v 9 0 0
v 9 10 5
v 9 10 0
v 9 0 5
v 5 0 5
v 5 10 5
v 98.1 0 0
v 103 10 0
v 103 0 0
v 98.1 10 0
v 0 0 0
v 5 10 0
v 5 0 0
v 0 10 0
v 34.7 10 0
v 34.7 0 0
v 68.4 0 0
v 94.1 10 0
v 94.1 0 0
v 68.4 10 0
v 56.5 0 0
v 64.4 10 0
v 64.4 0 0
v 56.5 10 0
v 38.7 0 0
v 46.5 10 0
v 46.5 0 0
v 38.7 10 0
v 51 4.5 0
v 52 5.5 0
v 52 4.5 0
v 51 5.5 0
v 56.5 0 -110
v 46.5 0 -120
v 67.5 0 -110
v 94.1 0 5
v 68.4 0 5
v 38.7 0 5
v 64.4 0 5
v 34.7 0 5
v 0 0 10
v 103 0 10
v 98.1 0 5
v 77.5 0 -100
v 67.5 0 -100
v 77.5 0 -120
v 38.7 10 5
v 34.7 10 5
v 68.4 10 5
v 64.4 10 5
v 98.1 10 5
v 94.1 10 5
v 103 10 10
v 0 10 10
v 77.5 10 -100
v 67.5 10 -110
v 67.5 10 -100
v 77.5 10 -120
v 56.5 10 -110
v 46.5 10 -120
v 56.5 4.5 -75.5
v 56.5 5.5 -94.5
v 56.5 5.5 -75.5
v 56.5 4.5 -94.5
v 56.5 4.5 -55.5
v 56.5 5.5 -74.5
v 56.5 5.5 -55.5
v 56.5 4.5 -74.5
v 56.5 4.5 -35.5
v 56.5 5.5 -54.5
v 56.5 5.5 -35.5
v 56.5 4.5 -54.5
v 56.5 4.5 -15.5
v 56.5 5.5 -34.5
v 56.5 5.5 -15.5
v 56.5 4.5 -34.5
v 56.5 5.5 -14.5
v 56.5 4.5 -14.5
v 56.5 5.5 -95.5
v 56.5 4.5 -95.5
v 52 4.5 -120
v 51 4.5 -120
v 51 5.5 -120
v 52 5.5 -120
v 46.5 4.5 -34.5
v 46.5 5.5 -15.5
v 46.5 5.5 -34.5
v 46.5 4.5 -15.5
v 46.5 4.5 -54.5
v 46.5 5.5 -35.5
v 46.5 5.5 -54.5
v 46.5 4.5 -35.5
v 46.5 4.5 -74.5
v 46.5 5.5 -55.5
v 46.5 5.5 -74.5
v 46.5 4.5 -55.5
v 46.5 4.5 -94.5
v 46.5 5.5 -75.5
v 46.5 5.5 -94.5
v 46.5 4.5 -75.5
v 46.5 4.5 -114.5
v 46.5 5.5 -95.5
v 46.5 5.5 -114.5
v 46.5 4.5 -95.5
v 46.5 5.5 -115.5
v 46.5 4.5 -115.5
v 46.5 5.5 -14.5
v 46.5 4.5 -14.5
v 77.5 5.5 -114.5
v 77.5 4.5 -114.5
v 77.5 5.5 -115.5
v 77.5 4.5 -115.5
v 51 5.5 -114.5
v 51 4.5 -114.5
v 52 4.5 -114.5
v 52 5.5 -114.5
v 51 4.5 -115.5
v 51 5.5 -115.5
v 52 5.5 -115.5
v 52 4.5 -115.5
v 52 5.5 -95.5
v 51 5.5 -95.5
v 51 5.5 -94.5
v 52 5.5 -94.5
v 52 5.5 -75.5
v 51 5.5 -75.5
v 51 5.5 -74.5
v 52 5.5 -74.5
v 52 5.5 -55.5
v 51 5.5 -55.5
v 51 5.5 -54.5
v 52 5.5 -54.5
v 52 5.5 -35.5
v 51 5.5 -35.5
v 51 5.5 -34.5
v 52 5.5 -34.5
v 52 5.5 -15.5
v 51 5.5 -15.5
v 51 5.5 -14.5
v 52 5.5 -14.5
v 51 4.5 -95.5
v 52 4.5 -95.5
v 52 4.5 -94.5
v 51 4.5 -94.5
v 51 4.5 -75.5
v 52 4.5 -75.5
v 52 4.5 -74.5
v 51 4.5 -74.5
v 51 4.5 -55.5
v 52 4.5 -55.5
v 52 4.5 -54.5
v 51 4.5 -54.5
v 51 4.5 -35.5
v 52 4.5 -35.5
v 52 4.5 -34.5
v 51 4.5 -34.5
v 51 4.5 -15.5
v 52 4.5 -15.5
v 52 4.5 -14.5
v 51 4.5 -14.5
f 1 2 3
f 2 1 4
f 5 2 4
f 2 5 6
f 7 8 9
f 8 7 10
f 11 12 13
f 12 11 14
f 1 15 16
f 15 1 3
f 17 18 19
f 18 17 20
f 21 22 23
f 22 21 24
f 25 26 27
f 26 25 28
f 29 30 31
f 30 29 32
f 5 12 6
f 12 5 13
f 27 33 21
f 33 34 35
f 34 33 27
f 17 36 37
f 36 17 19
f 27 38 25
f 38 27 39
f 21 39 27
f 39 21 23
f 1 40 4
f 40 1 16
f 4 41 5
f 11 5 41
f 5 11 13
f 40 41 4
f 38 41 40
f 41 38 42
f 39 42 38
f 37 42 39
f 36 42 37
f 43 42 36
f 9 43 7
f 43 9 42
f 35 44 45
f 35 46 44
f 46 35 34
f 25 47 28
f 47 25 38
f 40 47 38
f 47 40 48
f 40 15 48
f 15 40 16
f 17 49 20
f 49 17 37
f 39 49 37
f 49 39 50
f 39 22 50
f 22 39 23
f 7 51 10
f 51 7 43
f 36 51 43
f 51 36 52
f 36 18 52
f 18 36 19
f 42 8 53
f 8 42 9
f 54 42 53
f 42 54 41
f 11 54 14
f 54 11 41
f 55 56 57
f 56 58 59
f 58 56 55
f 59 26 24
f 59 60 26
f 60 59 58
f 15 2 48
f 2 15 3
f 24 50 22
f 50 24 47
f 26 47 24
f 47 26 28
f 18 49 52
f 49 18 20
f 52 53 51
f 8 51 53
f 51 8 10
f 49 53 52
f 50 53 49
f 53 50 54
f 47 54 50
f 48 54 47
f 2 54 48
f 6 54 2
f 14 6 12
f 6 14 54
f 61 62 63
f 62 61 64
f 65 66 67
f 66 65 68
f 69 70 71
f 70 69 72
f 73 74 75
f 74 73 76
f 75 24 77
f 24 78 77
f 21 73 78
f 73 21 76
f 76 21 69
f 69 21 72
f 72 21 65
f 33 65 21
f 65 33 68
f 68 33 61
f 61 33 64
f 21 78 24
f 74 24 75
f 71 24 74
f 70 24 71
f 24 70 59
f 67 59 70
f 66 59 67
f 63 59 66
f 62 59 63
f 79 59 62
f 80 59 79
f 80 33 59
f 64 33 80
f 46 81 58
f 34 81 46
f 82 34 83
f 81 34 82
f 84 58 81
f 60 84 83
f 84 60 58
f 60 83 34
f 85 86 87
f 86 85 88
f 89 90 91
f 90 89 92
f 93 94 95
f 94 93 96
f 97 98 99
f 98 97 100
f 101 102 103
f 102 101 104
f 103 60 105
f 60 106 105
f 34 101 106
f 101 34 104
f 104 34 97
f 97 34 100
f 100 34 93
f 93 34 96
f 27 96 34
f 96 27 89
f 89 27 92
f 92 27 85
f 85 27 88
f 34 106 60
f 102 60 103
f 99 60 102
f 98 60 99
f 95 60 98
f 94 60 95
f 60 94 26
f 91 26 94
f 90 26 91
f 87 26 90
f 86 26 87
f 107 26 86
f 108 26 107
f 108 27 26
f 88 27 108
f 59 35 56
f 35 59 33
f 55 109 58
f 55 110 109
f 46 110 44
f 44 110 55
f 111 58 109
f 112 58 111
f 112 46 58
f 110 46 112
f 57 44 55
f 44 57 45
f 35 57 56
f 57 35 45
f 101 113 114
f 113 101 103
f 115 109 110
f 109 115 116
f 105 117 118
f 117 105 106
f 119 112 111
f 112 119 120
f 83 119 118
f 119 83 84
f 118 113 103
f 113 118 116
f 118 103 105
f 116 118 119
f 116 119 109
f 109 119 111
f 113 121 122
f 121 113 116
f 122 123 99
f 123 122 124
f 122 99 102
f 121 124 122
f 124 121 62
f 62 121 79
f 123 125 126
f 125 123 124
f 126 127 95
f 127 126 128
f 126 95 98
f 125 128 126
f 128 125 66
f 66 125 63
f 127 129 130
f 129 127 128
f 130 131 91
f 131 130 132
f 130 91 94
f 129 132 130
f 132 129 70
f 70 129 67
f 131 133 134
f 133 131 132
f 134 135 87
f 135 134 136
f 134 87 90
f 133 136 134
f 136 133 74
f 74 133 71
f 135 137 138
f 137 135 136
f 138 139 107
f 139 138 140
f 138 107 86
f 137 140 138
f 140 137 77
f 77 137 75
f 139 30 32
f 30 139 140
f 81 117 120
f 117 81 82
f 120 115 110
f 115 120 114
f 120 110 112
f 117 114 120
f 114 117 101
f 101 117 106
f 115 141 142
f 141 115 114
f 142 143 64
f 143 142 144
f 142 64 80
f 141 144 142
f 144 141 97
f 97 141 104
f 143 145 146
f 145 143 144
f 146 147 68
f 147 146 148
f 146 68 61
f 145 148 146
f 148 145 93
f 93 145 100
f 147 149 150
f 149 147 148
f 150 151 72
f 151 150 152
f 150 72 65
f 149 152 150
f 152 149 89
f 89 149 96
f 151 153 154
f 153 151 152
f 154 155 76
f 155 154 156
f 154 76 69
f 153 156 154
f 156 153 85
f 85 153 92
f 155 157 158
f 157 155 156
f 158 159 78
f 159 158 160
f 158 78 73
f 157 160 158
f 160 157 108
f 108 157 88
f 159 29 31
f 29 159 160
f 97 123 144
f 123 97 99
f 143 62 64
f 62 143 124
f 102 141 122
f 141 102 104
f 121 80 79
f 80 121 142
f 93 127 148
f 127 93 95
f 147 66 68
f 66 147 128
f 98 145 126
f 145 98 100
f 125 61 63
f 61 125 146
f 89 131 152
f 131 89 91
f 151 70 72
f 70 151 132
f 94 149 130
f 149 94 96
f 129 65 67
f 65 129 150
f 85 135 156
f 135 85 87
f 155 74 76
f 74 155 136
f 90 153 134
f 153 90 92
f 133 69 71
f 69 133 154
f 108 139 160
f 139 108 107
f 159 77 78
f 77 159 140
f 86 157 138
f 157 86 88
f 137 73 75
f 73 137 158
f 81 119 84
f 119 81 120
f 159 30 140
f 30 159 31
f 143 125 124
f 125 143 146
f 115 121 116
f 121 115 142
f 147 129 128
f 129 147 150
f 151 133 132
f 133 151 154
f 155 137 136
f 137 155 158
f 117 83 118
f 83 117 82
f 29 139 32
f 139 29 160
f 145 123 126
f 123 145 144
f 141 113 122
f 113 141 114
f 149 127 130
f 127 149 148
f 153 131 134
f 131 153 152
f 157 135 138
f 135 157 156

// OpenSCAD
wire_space = 32.3-2.6;
wire_width  = 4;
roll_r         = 120;

mount_x = 103;
mount_y = 10;

bearing_hole = 8;

holder_arm();

//bar();

module bar(){

    difference(){
    union(){
    rotate([90,0,0])
    cylinder(80, 20, 20, $fn=100);

    translate([0,-40,0])
    cube([9.6,120,20], true);
    }
    
    
    translate([0,0,-60])
    cube([200,200,100], true);
    
    #translate([0,6,-4.8])
    cube([200,10.4,10.4], true);
    
    #translate([0,-86,-4.8])
    cube([200,10.4,10.4], true);
    
    #translate([0,0,5])
    cube([1,200,1], true);
    }
}

module hook(){
    cube([10,mount_y,roll_r]);
    
    translate([0,0,0])
    cube([30,10,10]);
    
    translate([21,0,0])
    cube([10,10,20]);
}

module holder_arm(){
difference(){
    cube([mount_x, mount_y, 10]);
    for(i = [0:wire_space:100])
        translate([i+5,0,0])
        cube([wire_width,30, 5]);
    }
    
translate([(mount_x-10)/2,0,-roll_r])
difference(){
hook();

translate([4.5,4.5,-10])
#cube([1,1,roll_r+40]);

for(i=[0:5]){
    translate([-10,4.5,4.5+i*20])
    #cube([60,1,1]);
}
}

}

module roll_core(){
translate([mount_x/2,0,-roll_r+10])
rotate([90,0,0]){

difference(){


union(){
translate([0,0,5+7.5])
cylinder(5, bearing_hole/2, bearing_hole/2-0.4);

cylinder(13, bearing_hole/2-0.4, bearing_hole/2-0.4);
}
cube([20,1,50], true);
}

cylinder(5, 12/2, 12/2);
}
}
